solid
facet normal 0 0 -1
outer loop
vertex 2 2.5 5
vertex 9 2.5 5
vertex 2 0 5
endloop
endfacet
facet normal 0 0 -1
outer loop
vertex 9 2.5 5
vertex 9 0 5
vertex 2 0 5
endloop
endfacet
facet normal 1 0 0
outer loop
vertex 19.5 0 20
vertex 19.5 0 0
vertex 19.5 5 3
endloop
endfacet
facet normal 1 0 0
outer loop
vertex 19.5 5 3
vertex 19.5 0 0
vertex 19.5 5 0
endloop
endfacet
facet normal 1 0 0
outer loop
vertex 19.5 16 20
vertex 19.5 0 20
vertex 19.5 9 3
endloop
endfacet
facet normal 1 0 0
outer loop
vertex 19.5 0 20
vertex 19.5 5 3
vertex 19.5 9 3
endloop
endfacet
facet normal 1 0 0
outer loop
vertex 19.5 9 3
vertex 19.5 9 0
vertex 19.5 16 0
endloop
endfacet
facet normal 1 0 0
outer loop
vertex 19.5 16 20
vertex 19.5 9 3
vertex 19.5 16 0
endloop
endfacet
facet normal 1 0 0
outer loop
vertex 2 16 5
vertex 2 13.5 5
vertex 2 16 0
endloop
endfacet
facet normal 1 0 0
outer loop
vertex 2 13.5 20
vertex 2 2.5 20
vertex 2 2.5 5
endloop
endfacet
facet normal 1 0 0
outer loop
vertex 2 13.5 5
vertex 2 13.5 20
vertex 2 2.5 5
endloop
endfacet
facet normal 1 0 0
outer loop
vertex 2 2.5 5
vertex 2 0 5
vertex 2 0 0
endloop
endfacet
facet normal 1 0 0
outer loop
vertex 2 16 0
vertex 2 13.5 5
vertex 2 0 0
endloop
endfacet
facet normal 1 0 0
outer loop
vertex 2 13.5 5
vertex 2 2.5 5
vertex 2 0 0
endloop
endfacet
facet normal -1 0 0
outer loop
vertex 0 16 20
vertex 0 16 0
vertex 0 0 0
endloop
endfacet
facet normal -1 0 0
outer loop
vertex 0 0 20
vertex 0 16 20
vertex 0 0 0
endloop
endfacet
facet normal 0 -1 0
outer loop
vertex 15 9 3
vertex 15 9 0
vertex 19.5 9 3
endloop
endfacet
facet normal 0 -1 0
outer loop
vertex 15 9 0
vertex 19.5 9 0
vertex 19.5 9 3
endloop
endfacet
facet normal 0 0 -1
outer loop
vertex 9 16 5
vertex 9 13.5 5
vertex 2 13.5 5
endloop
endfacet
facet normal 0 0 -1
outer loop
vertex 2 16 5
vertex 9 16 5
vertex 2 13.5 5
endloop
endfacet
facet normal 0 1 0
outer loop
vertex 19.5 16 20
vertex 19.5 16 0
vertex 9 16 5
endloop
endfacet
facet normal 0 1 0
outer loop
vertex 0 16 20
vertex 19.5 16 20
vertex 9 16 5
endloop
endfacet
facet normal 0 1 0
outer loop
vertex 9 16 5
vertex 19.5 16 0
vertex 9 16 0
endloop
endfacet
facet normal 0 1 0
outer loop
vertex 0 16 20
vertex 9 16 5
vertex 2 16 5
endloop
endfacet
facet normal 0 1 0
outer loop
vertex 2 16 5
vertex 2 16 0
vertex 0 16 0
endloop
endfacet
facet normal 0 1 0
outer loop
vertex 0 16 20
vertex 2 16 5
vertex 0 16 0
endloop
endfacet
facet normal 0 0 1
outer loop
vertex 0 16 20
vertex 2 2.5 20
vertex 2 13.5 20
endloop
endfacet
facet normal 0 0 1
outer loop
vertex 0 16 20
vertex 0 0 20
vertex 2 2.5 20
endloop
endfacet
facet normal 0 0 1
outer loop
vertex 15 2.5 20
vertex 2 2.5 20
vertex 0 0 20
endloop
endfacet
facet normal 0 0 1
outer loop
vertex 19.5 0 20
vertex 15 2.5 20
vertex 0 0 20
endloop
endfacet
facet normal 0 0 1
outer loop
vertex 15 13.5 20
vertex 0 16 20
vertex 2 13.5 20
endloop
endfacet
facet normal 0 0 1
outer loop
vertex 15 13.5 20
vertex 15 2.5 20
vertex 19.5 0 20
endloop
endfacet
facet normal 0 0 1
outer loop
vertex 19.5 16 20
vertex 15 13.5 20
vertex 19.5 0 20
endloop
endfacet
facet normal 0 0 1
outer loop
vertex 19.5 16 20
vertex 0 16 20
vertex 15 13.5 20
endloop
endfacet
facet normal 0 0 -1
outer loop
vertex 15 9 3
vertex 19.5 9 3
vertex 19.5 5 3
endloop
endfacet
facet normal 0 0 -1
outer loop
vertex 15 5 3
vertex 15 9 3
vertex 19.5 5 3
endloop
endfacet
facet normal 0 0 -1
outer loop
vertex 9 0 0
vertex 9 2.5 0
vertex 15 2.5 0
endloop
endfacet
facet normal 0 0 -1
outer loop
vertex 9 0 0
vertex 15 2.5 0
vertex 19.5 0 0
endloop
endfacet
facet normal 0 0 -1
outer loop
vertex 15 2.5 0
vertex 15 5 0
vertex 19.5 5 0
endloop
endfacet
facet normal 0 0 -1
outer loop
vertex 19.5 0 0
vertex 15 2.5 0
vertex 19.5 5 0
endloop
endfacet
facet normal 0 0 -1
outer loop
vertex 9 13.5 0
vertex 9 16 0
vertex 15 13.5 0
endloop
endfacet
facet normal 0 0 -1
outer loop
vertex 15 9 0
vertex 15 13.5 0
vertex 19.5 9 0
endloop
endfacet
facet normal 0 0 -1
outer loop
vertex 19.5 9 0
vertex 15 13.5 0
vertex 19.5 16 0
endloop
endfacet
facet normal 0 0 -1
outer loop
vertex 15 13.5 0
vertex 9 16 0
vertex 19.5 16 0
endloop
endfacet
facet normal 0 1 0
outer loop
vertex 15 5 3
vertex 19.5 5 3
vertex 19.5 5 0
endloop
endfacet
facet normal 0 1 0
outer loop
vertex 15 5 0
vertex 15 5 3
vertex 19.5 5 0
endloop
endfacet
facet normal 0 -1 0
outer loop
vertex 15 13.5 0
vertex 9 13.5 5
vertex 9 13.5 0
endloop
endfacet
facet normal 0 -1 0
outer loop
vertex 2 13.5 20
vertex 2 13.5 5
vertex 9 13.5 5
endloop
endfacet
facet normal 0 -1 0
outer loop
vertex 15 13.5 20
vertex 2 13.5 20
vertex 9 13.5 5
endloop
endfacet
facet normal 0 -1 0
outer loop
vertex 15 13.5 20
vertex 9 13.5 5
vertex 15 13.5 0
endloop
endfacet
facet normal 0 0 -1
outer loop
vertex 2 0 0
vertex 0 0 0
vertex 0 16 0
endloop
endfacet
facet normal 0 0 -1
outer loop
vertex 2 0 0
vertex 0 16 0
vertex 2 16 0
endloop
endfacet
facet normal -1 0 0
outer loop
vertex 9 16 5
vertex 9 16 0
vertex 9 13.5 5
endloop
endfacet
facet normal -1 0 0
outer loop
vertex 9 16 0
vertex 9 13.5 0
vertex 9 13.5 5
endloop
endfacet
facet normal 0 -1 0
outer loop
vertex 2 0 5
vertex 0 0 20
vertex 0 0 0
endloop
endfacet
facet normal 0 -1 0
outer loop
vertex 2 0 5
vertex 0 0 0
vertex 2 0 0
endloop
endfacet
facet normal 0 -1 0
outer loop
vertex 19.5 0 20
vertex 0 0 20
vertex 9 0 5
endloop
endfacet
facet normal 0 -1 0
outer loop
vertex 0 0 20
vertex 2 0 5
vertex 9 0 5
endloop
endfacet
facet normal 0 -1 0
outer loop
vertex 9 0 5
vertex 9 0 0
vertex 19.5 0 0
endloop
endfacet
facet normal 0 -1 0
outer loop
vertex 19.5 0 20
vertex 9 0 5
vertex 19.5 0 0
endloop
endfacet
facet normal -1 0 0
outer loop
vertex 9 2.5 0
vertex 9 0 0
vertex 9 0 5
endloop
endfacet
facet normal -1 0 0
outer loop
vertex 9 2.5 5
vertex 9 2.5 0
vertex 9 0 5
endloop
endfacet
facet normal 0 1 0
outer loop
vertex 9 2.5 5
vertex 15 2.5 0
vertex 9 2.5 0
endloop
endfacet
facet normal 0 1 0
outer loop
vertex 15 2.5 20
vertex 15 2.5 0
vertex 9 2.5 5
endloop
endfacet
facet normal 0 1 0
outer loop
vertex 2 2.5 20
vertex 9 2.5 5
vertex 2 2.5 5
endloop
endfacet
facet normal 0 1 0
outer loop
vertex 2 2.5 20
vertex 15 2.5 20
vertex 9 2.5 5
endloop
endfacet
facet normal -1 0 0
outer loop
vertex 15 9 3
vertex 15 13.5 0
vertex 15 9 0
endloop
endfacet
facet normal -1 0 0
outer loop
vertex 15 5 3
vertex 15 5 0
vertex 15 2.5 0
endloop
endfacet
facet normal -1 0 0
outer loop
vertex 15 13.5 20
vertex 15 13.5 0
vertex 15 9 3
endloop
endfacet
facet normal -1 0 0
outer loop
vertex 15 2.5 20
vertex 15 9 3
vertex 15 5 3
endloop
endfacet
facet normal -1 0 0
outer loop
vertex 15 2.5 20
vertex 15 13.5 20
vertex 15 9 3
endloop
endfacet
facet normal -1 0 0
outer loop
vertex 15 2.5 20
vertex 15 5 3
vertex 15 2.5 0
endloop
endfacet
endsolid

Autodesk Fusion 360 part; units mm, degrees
sketch "Sketch1" plane through (0, 0, 0) normal (0, 0, 1) x (1, 0, 0)
  line L0 (0, 0) -> (19.5, 0)
  line L1 (19.5, 0) -> (19.5, 16)
  line L2 (19.5, 16) -> (0, 16)
  line L3 (0, 16) -> (0, 0)
  dimension "d1" = 19.5
  dimension "d2" = 16
extrude "Extrude1" add sketch "Sketch1" along normal blind 20
sketch "Sketch2" plane through (0, 0, 0) normal (0, -1, 0) x (1, 0, 0)
  line L0 (0, 0) -> (19.5, 0)
  line L1 (19.5, 0) -> (19.5, 20)
  line L2 (19.5, 20) -> (0, 20)
  line L3 (0, 20) -> (0, 0)
  line L4 (2, 0) -> (9, 0)
  line L5 (9, 0) -> (9, 5)
  line L6 (9, 5) -> (2, 5)
  line L7 (2, 5) -> (2, 0)
  dimension "d5" = 2
extrude "Extrude2" cut sketch "Sketch2" against normal blind 47 contours L0 L4 L5 L6 L7
sketch "Sketch3" plane through (0, 0, 20) normal (0, 0, 1) x (-1, 0, 0)
  line L0 (0, -16) -> (0, 0)
  line L1 (0, 0) -> (-19.5, 0)
  line L2 (-19.5, 0) -> (-19.5, -16)
  line L3 (-19.5, -16) -> (0, -16)
  line L4 (5, -8) -> (-24, -8) construction
  line L5 (-2, -13.5) -> (-15, -13.5)
  line L6 (-15, -13.5) -> (-15, -2.5)
  line L7 (-15, -2.5) -> (-2, -2.5)
  line L8 (-2, -2.5) -> (-2, -13.5)
  dimension "d8" = 8
  dimension "d9" = 13
  dimension "d10" = 11
  dimension "d11" = 2
  dimension "d12" = 5.5
extrude "Extrude3" cut sketch "Sketch3" against normal blind 36 contours L5 L6 L7 L8
sketch "Sketch4" plane through (19.5, 0, 0) normal (1, 0, 0) x (0, 1, 0)
  line L0 (0, 0) -> (16, 0)
  line L1 (16, 0) -> (16, 20)
  line L2 (16, 20) -> (0, 20)
  line L3 (0, 20) -> (0, 0)
  line L4 (5, 0) -> (9, 0)
  line L5 (9, 0) -> (9, 3)
  line L6 (9, 3) -> (5, 3)
  line L7 (5, 3) -> (5, 0)
extrude "Extrude4" cut sketch "Sketch4" against normal blind 8 contours L0 L4 L5 L6 L7
